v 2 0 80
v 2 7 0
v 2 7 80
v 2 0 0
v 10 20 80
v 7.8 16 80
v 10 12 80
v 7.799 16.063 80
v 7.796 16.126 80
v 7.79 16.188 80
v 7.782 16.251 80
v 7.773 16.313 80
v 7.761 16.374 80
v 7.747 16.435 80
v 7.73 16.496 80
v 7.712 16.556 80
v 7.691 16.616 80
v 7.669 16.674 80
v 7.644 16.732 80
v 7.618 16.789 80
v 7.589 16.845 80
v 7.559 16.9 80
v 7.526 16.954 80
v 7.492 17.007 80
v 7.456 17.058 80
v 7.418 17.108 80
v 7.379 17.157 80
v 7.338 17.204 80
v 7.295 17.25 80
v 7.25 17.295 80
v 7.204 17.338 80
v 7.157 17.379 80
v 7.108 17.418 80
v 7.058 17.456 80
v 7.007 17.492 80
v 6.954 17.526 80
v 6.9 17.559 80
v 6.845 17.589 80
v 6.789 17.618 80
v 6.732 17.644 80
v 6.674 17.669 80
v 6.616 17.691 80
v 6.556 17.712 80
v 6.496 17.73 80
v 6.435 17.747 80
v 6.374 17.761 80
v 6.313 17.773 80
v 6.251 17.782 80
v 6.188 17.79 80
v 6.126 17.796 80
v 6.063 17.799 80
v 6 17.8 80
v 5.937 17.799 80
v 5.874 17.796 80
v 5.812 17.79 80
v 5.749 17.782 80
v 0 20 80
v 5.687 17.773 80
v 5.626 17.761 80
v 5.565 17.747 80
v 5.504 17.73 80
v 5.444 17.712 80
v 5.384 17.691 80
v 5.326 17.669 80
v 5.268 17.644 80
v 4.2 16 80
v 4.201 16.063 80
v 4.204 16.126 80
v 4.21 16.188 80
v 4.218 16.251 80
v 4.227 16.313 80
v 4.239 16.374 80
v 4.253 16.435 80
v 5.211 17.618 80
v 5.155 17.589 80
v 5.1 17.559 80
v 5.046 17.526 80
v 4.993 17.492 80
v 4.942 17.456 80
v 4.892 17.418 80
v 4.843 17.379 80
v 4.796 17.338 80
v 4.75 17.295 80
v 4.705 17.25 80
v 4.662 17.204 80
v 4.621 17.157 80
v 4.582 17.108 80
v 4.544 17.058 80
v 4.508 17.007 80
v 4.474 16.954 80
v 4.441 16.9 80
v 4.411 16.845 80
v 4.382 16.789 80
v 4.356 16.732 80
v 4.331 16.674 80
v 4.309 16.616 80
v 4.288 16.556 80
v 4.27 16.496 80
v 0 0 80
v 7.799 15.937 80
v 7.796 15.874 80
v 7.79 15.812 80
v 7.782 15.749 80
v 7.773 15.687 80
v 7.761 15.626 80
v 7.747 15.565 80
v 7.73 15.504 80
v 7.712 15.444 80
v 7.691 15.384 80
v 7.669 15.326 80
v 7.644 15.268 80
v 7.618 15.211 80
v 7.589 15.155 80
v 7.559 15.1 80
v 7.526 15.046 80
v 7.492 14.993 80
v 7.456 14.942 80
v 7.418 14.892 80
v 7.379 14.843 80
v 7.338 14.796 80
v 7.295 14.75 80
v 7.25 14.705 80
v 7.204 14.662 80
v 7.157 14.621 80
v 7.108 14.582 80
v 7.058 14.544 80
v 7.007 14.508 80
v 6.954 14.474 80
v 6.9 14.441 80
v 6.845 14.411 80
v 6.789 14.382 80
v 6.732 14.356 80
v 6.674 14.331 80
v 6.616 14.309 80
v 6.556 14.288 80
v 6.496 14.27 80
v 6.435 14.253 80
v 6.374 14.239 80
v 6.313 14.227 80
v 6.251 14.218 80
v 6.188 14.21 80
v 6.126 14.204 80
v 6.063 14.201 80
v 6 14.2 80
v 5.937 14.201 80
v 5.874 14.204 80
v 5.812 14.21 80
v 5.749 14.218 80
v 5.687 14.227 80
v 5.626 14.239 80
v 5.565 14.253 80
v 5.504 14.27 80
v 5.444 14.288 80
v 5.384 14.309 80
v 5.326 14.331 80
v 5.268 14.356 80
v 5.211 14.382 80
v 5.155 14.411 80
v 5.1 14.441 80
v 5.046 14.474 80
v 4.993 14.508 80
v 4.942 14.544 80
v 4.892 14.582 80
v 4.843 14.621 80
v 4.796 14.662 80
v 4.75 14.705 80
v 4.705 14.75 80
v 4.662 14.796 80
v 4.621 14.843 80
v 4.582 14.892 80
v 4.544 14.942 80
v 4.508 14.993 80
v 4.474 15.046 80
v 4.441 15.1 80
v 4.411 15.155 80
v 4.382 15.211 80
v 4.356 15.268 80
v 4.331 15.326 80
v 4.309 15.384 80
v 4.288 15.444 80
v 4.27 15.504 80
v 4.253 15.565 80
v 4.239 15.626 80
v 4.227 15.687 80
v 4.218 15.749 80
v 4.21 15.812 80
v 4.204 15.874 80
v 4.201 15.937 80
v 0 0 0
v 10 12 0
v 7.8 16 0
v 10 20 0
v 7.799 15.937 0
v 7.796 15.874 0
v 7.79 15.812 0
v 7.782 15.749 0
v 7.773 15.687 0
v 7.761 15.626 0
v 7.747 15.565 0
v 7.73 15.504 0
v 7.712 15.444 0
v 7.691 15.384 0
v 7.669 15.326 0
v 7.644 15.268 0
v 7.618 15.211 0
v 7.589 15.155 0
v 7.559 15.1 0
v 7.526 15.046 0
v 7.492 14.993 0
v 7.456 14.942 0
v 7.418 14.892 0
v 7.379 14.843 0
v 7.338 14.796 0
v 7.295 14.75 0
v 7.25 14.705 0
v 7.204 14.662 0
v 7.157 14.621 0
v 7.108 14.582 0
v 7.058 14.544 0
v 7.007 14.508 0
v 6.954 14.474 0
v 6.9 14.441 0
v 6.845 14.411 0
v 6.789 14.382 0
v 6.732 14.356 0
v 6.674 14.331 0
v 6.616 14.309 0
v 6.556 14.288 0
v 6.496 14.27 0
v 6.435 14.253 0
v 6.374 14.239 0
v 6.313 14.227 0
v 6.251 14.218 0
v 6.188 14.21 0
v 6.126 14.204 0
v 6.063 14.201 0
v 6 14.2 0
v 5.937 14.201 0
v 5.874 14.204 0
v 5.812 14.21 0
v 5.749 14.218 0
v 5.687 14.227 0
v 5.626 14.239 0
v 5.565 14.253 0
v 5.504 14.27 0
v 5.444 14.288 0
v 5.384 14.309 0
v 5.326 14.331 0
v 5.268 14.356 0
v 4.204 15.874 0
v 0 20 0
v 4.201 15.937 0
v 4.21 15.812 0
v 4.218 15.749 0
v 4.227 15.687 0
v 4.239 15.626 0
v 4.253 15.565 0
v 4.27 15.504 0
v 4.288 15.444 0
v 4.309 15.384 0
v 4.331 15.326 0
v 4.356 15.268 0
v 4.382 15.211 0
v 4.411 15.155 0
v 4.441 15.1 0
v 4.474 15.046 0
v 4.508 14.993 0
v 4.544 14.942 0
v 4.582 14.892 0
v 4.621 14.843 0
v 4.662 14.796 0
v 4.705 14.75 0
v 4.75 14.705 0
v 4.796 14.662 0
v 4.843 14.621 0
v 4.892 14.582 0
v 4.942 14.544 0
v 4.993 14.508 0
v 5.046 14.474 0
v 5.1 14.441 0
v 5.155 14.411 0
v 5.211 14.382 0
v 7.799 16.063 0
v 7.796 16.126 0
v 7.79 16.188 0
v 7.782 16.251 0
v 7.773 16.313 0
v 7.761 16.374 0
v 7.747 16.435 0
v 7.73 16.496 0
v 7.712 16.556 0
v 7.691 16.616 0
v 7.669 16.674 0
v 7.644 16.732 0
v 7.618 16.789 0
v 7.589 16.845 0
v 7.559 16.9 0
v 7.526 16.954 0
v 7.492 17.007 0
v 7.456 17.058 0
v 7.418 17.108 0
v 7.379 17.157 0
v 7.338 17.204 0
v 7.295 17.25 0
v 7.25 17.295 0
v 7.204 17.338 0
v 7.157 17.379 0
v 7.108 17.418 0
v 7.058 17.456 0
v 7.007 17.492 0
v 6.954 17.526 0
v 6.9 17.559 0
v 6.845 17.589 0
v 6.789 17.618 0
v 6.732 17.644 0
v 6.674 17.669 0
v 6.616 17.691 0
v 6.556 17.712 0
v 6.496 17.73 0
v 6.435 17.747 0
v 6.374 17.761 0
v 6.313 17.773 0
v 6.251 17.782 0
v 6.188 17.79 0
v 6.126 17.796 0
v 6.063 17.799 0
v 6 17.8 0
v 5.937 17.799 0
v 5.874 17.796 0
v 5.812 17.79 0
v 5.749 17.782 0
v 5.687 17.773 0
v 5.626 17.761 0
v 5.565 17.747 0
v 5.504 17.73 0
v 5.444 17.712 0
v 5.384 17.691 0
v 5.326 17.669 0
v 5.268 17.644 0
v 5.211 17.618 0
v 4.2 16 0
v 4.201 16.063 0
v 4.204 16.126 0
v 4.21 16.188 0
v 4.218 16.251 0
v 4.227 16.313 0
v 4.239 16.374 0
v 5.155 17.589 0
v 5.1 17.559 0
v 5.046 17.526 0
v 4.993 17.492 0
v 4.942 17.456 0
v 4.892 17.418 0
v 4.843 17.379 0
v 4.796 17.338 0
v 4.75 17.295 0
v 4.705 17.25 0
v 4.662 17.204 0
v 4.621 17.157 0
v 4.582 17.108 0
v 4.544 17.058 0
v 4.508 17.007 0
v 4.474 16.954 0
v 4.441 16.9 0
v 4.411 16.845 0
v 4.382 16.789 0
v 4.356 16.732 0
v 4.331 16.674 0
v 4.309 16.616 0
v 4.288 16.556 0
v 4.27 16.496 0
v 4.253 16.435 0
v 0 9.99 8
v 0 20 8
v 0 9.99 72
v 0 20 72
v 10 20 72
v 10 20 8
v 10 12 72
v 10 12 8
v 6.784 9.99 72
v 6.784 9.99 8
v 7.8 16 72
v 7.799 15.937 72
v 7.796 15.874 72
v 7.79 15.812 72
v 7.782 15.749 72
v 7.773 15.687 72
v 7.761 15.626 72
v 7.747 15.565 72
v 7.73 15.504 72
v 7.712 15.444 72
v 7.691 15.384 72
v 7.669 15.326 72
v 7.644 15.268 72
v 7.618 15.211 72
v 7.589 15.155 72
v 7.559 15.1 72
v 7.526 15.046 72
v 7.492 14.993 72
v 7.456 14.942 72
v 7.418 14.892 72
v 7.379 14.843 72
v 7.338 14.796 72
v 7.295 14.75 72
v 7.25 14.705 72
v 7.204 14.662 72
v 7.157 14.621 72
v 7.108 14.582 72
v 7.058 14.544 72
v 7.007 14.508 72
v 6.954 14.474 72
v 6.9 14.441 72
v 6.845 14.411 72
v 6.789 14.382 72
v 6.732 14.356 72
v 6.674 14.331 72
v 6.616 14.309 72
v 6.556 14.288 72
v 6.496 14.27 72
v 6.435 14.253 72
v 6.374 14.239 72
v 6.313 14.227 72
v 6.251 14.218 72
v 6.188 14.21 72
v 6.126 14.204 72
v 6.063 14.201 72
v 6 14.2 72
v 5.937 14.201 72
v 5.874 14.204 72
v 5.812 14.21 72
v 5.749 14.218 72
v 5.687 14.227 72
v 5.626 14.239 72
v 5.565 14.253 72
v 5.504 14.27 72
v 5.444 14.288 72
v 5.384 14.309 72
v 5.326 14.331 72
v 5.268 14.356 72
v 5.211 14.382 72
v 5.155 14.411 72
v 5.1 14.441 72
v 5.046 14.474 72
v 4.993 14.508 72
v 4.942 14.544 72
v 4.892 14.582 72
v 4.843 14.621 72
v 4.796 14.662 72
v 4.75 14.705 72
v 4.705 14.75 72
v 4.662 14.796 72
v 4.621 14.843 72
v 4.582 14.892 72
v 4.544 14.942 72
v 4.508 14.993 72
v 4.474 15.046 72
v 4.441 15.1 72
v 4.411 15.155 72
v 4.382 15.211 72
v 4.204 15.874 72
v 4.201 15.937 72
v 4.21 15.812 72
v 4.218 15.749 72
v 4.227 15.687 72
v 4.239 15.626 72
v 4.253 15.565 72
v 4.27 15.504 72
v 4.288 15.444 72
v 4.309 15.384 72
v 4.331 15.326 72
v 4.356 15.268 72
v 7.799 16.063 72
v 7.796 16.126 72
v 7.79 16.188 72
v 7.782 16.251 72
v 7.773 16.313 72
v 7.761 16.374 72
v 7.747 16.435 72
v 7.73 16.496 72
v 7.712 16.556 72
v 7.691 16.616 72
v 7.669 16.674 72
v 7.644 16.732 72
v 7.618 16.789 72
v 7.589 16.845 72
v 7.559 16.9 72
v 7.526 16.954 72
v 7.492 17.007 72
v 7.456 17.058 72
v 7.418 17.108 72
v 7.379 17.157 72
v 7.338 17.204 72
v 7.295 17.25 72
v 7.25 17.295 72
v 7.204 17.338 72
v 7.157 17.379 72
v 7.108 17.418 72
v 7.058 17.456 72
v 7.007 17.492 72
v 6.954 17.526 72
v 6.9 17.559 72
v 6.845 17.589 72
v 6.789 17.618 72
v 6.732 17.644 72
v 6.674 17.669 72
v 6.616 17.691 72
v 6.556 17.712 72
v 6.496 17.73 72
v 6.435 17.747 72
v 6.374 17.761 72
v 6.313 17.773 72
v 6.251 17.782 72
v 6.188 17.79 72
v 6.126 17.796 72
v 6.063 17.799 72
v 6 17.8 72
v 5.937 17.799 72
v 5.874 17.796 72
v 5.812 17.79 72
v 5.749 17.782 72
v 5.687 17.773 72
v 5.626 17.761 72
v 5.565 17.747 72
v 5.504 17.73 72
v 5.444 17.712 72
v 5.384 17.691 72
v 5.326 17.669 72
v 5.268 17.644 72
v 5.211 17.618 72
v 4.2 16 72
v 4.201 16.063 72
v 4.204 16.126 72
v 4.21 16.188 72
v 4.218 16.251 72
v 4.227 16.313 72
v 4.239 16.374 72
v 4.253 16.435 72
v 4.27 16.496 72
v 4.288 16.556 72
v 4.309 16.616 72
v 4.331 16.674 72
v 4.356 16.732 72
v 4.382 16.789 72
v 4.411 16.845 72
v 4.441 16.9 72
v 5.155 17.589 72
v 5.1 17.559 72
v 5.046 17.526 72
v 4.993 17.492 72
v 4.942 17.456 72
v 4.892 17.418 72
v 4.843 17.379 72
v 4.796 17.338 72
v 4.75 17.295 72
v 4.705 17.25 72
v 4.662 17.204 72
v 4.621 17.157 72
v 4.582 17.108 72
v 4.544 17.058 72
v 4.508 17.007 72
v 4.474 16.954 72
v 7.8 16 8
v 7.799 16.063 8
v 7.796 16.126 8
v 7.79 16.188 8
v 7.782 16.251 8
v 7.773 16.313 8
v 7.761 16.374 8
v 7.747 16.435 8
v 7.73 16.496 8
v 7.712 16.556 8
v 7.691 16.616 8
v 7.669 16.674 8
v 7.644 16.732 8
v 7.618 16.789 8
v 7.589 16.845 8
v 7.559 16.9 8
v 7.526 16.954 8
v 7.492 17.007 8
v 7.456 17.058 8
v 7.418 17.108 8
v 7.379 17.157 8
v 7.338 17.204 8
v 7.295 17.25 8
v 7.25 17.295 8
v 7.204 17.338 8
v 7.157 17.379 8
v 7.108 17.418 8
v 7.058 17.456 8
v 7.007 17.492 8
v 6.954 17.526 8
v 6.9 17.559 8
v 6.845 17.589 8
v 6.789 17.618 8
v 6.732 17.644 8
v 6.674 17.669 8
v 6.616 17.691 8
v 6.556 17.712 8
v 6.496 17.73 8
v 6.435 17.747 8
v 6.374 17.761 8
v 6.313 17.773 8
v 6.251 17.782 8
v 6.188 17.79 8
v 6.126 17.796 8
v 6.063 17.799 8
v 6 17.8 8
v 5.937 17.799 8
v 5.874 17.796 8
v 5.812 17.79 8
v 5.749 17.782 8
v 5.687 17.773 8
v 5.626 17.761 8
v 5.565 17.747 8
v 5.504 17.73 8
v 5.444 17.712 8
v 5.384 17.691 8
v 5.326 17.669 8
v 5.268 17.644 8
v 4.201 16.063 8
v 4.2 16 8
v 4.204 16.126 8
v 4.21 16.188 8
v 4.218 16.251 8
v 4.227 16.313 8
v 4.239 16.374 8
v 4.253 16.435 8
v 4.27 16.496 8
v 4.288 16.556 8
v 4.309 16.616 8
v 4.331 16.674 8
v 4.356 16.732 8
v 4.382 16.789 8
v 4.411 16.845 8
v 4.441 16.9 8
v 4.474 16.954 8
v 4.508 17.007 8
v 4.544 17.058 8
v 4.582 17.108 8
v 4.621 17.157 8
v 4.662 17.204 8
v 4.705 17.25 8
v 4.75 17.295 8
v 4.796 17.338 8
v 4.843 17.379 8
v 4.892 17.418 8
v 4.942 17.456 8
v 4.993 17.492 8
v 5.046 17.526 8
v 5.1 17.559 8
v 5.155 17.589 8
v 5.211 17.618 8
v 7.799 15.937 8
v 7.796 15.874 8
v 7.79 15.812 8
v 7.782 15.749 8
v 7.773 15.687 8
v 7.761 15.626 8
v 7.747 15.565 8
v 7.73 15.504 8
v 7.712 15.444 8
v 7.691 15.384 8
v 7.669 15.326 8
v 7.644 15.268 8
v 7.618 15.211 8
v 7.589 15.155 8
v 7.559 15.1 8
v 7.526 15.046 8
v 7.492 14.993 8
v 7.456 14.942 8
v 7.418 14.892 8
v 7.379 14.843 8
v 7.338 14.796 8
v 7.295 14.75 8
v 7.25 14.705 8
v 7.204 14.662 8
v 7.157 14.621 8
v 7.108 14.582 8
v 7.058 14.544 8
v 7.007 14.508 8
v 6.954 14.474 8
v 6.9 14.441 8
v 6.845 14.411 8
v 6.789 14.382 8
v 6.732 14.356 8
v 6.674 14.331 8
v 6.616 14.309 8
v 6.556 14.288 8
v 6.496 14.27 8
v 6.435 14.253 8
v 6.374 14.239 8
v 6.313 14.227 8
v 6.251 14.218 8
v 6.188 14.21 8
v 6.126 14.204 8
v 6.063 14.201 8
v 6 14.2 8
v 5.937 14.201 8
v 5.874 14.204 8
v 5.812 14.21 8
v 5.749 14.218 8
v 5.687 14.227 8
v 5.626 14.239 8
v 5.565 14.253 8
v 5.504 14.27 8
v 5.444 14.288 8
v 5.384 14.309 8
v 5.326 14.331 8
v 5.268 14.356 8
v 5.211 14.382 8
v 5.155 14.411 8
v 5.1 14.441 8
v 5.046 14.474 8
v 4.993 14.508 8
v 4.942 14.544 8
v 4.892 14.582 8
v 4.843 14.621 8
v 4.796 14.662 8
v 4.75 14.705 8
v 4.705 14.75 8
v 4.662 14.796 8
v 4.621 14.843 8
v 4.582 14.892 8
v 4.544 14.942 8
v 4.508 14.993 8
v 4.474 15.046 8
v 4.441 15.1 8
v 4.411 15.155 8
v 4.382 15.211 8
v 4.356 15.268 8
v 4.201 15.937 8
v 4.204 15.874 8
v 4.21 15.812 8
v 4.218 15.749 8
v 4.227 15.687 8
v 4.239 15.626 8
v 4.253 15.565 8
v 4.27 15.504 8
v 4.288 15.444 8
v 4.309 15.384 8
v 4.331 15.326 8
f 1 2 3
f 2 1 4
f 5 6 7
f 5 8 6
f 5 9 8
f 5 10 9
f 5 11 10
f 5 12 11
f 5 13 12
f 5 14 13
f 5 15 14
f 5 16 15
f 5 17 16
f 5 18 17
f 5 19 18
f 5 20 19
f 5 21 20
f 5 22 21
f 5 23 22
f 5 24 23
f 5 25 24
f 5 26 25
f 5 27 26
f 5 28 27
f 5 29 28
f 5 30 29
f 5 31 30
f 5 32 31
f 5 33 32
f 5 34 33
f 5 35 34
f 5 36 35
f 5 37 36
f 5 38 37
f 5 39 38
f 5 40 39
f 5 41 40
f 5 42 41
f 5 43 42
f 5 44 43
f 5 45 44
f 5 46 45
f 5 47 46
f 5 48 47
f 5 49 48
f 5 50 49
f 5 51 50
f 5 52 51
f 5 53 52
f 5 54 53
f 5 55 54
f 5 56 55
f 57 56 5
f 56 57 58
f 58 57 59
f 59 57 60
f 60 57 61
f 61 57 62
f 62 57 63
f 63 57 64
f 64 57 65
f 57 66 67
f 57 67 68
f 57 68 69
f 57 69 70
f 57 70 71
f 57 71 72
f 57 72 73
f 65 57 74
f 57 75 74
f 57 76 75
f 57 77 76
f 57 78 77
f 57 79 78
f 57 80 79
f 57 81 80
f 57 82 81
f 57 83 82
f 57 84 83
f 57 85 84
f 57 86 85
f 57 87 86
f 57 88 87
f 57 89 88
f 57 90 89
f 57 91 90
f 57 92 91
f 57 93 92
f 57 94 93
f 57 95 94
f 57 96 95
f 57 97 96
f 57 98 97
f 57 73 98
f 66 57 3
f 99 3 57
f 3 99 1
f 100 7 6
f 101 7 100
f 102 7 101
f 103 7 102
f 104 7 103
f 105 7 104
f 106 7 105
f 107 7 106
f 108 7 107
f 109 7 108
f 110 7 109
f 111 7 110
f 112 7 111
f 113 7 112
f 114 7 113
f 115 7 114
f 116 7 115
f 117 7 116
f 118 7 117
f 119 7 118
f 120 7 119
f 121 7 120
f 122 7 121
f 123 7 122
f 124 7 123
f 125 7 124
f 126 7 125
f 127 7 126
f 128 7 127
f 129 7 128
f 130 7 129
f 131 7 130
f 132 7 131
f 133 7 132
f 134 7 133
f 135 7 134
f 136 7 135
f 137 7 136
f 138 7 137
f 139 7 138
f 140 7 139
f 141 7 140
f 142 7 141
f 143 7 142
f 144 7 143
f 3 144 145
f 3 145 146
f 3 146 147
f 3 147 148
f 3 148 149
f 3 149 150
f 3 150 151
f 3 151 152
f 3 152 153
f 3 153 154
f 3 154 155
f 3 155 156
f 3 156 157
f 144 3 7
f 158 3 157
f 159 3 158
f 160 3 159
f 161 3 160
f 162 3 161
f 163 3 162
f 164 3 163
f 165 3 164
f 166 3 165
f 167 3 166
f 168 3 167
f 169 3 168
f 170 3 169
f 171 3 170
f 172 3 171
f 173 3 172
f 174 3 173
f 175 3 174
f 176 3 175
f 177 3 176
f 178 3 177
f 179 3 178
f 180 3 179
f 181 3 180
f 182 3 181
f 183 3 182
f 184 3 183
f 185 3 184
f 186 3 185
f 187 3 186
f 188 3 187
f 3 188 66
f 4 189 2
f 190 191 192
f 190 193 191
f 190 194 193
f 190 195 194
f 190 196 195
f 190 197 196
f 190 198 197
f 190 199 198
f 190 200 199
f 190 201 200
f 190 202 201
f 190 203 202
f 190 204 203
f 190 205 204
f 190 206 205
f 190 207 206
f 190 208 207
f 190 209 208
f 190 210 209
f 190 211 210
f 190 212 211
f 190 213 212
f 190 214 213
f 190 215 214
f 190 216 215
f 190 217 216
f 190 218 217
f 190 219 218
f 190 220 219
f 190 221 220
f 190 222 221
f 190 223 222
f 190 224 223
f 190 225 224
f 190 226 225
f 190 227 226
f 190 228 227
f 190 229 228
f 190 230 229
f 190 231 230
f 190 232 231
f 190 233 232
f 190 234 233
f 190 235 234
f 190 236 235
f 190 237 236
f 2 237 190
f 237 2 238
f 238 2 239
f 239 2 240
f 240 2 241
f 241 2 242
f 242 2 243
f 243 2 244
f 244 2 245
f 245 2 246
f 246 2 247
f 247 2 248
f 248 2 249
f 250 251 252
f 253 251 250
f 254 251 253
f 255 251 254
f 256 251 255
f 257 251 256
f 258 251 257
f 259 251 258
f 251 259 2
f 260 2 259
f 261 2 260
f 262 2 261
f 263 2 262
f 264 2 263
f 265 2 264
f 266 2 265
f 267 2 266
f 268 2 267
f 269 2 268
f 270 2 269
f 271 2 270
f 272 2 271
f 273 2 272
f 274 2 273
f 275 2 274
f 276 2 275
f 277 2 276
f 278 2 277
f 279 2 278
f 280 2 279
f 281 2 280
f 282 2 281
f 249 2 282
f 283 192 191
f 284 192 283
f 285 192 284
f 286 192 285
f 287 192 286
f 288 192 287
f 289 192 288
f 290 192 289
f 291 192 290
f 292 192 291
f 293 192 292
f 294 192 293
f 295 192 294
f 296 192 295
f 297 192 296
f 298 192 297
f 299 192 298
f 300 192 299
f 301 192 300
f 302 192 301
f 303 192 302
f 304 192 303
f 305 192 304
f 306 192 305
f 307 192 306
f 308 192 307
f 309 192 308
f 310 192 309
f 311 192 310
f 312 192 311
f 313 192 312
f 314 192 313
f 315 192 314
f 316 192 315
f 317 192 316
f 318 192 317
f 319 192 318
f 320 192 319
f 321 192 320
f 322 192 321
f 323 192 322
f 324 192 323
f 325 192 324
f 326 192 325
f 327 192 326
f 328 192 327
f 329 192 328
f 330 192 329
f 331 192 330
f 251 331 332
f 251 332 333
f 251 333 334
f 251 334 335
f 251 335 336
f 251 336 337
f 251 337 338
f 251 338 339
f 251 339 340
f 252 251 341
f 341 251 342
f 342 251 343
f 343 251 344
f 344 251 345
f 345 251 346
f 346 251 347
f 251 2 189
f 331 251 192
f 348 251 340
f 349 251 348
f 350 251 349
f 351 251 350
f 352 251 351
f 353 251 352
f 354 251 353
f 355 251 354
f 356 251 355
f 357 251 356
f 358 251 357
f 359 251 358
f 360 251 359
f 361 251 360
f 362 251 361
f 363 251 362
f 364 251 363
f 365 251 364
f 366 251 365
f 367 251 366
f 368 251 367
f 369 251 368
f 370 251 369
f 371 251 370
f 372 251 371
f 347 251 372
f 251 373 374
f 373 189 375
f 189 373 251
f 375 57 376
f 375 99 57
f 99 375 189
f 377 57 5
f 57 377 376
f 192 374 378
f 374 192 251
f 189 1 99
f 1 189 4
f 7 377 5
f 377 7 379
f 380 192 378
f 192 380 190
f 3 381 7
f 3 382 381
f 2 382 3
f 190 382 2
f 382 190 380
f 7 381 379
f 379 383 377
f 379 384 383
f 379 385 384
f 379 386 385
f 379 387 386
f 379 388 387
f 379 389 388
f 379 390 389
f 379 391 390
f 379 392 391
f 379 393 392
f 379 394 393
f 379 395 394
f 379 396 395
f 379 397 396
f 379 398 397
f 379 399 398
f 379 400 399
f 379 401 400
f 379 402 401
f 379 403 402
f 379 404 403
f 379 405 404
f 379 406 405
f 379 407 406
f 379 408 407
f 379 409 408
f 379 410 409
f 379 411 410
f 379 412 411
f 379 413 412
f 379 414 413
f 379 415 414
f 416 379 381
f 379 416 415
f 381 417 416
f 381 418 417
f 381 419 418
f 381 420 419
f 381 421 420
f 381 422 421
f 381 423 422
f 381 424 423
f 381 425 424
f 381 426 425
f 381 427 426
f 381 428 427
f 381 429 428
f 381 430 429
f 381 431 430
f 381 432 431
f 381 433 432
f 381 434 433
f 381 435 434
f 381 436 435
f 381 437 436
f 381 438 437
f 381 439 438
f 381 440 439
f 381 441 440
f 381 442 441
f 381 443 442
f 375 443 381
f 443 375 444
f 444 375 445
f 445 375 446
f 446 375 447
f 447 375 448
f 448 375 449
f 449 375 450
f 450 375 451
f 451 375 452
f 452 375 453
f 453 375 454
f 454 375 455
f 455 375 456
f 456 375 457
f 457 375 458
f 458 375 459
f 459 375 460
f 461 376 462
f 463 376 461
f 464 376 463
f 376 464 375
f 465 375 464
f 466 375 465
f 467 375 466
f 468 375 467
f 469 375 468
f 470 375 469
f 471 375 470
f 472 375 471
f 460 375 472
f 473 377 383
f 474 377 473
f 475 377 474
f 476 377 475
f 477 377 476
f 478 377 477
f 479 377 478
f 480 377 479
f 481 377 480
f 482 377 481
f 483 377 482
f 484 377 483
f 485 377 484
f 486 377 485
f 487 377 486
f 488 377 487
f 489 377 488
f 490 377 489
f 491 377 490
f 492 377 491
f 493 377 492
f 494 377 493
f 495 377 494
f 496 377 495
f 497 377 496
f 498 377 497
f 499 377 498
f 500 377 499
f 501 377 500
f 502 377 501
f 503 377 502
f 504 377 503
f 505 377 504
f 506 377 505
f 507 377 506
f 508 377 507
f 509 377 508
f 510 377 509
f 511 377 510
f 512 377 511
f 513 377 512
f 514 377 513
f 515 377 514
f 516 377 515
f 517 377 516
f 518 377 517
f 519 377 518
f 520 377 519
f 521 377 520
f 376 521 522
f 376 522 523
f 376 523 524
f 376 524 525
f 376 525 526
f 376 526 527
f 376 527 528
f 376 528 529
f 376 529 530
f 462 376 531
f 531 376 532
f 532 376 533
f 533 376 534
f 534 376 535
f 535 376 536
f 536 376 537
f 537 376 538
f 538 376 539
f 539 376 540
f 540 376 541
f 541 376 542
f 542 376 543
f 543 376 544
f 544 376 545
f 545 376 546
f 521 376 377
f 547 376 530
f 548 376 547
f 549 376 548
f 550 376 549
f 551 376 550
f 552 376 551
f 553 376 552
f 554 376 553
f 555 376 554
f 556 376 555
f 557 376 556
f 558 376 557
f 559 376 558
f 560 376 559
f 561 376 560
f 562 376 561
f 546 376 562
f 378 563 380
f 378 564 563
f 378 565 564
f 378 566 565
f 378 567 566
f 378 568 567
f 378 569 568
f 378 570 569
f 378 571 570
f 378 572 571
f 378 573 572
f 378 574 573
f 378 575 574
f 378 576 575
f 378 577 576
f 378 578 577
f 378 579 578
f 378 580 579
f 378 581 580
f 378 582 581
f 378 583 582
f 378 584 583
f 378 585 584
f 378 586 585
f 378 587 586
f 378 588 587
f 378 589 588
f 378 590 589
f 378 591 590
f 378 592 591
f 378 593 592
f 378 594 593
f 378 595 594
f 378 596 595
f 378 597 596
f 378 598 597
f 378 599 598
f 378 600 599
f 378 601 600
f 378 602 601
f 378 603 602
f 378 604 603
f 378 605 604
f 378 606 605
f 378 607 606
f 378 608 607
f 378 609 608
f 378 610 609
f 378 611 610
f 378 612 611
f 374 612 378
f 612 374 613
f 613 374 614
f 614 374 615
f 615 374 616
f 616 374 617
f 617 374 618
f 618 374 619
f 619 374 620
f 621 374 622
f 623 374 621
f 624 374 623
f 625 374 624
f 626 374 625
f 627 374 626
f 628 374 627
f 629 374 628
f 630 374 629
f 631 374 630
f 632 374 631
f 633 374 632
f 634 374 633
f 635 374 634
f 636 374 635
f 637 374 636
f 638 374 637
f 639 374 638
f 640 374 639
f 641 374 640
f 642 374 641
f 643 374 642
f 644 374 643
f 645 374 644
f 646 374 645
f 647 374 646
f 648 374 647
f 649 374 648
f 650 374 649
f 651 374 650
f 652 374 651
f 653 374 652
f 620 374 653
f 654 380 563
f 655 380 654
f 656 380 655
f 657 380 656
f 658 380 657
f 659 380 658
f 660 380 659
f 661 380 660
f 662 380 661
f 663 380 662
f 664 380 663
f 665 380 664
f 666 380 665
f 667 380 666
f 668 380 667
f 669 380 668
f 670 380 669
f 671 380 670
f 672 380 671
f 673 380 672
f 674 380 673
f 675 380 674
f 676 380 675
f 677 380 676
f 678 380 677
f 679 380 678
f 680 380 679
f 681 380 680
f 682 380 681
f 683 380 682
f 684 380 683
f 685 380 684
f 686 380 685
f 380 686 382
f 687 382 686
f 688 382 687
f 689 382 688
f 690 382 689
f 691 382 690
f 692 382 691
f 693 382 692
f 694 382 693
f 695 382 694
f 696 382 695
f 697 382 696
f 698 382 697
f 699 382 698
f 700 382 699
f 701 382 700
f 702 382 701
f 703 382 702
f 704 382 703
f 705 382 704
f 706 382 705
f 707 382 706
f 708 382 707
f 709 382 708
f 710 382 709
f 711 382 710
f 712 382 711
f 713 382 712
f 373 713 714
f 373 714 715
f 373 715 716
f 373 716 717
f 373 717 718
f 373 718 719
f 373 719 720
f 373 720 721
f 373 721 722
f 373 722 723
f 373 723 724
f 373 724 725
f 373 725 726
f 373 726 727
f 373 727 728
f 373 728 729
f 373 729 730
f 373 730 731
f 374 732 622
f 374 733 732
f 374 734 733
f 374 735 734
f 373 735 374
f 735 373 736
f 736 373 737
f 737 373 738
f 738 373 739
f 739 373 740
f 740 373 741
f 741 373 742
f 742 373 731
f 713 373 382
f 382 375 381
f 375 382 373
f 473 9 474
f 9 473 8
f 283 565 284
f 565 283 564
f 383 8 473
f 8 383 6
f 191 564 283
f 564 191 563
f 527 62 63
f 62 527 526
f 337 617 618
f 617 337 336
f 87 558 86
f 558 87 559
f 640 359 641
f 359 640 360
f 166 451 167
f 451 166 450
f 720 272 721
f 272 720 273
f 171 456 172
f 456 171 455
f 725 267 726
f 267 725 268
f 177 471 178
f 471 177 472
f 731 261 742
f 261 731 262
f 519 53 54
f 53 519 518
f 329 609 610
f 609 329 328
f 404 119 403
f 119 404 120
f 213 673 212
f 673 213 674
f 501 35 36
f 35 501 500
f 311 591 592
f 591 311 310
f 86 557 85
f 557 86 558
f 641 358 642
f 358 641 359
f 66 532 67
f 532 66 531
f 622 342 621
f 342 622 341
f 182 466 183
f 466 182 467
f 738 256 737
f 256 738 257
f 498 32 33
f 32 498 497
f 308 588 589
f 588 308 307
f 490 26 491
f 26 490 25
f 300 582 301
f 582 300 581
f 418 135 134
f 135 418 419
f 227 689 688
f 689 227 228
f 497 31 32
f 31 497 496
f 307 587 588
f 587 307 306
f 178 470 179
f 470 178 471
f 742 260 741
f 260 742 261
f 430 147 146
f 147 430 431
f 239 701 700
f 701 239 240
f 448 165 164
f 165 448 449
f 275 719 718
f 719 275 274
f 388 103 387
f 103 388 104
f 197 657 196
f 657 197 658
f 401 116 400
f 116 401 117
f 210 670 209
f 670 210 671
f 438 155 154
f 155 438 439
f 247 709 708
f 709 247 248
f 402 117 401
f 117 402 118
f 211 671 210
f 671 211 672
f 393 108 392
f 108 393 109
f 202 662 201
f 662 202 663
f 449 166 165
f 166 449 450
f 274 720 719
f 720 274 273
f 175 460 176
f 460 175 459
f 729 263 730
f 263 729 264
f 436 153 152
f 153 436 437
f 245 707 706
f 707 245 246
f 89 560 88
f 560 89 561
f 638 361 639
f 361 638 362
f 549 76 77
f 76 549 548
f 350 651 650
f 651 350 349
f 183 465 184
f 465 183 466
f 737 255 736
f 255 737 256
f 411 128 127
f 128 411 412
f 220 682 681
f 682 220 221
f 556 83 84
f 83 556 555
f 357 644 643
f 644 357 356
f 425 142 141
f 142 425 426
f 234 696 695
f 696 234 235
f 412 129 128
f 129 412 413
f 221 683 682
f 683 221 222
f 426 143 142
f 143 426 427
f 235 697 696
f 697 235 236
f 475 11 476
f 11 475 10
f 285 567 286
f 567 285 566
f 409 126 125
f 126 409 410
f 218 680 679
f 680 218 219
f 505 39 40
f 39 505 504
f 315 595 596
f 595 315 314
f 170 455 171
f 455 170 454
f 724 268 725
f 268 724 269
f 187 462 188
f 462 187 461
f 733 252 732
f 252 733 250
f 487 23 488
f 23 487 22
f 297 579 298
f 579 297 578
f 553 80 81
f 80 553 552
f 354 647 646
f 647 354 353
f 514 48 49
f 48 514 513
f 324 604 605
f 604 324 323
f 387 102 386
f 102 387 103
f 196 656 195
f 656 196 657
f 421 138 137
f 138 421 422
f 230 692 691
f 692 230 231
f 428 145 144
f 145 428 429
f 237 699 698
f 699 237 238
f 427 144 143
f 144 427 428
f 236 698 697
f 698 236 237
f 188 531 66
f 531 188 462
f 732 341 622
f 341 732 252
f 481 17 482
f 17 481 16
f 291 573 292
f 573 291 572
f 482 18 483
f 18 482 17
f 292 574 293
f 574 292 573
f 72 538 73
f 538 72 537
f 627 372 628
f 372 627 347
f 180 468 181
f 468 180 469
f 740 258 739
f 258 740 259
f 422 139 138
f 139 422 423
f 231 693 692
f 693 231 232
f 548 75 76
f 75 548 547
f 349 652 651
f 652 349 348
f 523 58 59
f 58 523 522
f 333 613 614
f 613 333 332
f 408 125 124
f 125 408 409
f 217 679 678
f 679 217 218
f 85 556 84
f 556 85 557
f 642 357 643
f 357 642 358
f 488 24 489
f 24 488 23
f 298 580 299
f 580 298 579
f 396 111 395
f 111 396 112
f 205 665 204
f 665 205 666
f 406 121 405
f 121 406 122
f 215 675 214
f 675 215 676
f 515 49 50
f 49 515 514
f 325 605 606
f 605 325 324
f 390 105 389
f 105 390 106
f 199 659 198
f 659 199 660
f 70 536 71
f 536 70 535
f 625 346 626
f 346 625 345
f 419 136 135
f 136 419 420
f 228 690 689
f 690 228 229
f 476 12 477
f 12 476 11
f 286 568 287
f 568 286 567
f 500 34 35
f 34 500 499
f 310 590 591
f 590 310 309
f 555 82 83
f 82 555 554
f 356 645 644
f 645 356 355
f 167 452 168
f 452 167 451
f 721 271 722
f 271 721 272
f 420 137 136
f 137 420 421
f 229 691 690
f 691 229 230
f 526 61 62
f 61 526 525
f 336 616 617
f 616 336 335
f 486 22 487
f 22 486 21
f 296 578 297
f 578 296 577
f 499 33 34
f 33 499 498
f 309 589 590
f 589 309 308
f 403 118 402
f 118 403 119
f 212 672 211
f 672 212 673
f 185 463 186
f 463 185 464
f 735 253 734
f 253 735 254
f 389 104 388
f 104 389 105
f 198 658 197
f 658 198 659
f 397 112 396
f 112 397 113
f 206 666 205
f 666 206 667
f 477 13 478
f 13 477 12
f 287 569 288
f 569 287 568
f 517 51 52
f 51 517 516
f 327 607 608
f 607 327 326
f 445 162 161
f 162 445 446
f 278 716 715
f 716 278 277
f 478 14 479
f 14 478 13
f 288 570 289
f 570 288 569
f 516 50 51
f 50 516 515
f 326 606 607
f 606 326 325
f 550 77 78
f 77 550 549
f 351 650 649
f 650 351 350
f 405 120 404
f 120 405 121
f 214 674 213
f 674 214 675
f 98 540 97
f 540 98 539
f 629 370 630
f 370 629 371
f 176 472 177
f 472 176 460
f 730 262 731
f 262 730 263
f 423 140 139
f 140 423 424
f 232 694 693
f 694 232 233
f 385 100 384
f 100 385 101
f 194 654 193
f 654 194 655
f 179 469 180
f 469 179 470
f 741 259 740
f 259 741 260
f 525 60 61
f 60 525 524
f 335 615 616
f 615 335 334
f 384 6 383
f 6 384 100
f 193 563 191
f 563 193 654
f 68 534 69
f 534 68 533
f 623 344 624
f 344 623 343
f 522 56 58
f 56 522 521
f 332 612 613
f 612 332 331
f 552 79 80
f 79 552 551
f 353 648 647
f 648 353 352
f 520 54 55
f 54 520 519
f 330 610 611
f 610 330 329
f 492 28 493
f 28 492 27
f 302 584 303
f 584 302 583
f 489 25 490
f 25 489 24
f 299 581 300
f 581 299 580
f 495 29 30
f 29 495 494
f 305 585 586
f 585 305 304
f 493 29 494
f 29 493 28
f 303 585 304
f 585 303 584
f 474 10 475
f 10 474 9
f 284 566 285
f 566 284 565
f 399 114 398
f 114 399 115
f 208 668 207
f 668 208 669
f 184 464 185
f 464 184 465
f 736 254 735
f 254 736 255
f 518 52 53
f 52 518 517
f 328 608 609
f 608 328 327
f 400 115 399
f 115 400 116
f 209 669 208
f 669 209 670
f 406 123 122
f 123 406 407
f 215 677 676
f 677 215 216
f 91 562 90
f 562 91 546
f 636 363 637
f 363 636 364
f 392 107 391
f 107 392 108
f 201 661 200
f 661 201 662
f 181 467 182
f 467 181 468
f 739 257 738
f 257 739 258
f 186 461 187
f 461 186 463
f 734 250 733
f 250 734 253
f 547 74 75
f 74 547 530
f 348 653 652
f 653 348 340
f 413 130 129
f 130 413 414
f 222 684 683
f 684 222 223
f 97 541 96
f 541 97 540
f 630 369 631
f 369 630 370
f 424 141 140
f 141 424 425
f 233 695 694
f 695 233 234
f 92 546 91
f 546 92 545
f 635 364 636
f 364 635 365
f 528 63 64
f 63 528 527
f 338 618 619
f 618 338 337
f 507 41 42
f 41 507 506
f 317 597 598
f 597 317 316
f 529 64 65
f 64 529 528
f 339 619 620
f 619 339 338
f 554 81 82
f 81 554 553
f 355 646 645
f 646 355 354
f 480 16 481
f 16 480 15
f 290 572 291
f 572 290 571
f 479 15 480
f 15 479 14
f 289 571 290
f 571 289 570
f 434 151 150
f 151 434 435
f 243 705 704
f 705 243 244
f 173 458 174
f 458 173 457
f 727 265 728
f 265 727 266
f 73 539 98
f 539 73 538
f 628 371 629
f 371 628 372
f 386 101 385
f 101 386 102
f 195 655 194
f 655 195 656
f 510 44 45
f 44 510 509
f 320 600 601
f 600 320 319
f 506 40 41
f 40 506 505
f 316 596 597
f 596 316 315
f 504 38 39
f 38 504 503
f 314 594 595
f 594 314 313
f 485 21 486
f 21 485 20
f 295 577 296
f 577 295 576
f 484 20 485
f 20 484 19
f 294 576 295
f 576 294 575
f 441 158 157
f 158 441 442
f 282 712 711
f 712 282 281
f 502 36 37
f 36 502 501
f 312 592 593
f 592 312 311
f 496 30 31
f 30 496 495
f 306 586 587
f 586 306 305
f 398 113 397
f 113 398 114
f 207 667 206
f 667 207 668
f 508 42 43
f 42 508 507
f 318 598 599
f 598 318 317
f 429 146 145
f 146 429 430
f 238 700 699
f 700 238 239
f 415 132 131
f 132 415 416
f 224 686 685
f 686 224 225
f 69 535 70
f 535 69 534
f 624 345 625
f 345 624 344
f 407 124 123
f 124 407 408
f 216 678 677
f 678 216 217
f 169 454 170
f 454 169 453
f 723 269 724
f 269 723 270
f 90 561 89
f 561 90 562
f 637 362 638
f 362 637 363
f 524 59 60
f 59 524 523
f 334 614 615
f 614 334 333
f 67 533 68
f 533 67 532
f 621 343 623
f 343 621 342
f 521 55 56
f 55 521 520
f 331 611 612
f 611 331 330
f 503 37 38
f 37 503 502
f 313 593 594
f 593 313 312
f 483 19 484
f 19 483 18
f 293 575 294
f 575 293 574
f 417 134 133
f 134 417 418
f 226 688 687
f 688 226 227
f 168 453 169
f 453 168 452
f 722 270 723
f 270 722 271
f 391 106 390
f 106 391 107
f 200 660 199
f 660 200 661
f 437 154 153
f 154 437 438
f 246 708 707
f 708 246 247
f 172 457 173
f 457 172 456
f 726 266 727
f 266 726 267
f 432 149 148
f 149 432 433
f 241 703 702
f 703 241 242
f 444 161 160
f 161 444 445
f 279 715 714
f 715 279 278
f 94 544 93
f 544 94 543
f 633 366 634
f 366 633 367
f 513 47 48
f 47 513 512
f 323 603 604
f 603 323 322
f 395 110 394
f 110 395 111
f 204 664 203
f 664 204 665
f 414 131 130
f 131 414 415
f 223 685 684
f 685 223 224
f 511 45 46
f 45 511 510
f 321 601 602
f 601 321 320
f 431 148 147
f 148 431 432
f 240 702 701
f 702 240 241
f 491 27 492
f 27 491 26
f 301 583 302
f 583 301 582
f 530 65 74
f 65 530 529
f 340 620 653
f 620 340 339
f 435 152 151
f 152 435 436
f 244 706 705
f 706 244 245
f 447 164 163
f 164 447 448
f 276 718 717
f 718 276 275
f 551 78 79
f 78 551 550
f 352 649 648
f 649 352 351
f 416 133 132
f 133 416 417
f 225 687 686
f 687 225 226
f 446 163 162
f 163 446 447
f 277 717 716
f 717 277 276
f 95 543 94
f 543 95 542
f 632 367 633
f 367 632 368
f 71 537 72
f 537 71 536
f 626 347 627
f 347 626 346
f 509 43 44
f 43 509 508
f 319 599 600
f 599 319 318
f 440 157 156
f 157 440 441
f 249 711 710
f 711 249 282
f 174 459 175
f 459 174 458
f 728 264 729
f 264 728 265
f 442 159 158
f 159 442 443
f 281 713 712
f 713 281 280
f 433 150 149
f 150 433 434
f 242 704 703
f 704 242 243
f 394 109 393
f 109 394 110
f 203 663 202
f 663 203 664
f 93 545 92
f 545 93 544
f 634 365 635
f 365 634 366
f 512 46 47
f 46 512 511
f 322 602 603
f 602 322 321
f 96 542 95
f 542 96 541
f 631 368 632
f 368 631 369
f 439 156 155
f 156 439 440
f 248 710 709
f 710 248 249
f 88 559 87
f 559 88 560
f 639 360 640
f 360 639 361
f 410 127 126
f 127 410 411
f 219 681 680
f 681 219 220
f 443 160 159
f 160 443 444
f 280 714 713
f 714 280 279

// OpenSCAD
/*Created by Doug Wolfe of wolfescience.com 2022
This work is licensed under a Creative Commons Attribution-NonCommercial-ShareAlike 4.0 International License.

http://creativecommons.org/licenses/by-nc-sa/4.0/
*/

//A 2mm drive axle works great with an axleOffset=15 and a axlediameter of 2.2
//A 3mm brake axle works great with an axleOffset = 2 and an axlediameter of 3.6

//diameter of axle in mm, maximum diameter = 14 mm
axleDiameter = 3.6; //diameter of axle increase to allow axle to move.  
//A 2.2 diameter works for a 2mm axle on some 3d printers.
axleOffset = 2; //axle length from base
baseLength = 10; //length of base
baseThickness = 2;
axleWidth = 80; //the width of the axle and base
cutWidth = 50;
axleSupportThickness = 4.4;


//Do not change below here
axleHolder=axleDiameter+axleSupportThickness;
$fn=180; // number of fragments in 360 degrees

difference()
{
	outer();
	cut();
}

//cylinder(h=4,d=50,center=true);

module outer()
{
	
cube([baseThickness,baseLength+axleOffset+axleHolder,axleWidth]);
	hull(){
translate([0,baseLength-3,0])
cube([baseThickness,1,axleWidth]);
translate([baseThickness,baseLength+axleOffset,0])
cube([axleHolder,axleHolder,axleWidth]);
	}
}

module cut()
{
	//cut offset
	translate([-.01,baseLength-.01,axleHolder])
cube([baseThickness+axleHolder+.02,axleOffset+.02,axleWidth-axleHolder*2]);
	//cut under axle
translate([-.01,baseLength+axleOffset-.01,axleHolder])
cube([baseThickness+axleHolder+.02,axleHolder+.02,axleWidth-axleHolder*2]);
	//cut axle hole
translate([baseThickness+axleHolder/2,baseLength+axleOffset+axleHolder/2,-.01])
cylinder(h=axleWidth+1,d=axleDiameter);
}
 echo("Version:",version());
